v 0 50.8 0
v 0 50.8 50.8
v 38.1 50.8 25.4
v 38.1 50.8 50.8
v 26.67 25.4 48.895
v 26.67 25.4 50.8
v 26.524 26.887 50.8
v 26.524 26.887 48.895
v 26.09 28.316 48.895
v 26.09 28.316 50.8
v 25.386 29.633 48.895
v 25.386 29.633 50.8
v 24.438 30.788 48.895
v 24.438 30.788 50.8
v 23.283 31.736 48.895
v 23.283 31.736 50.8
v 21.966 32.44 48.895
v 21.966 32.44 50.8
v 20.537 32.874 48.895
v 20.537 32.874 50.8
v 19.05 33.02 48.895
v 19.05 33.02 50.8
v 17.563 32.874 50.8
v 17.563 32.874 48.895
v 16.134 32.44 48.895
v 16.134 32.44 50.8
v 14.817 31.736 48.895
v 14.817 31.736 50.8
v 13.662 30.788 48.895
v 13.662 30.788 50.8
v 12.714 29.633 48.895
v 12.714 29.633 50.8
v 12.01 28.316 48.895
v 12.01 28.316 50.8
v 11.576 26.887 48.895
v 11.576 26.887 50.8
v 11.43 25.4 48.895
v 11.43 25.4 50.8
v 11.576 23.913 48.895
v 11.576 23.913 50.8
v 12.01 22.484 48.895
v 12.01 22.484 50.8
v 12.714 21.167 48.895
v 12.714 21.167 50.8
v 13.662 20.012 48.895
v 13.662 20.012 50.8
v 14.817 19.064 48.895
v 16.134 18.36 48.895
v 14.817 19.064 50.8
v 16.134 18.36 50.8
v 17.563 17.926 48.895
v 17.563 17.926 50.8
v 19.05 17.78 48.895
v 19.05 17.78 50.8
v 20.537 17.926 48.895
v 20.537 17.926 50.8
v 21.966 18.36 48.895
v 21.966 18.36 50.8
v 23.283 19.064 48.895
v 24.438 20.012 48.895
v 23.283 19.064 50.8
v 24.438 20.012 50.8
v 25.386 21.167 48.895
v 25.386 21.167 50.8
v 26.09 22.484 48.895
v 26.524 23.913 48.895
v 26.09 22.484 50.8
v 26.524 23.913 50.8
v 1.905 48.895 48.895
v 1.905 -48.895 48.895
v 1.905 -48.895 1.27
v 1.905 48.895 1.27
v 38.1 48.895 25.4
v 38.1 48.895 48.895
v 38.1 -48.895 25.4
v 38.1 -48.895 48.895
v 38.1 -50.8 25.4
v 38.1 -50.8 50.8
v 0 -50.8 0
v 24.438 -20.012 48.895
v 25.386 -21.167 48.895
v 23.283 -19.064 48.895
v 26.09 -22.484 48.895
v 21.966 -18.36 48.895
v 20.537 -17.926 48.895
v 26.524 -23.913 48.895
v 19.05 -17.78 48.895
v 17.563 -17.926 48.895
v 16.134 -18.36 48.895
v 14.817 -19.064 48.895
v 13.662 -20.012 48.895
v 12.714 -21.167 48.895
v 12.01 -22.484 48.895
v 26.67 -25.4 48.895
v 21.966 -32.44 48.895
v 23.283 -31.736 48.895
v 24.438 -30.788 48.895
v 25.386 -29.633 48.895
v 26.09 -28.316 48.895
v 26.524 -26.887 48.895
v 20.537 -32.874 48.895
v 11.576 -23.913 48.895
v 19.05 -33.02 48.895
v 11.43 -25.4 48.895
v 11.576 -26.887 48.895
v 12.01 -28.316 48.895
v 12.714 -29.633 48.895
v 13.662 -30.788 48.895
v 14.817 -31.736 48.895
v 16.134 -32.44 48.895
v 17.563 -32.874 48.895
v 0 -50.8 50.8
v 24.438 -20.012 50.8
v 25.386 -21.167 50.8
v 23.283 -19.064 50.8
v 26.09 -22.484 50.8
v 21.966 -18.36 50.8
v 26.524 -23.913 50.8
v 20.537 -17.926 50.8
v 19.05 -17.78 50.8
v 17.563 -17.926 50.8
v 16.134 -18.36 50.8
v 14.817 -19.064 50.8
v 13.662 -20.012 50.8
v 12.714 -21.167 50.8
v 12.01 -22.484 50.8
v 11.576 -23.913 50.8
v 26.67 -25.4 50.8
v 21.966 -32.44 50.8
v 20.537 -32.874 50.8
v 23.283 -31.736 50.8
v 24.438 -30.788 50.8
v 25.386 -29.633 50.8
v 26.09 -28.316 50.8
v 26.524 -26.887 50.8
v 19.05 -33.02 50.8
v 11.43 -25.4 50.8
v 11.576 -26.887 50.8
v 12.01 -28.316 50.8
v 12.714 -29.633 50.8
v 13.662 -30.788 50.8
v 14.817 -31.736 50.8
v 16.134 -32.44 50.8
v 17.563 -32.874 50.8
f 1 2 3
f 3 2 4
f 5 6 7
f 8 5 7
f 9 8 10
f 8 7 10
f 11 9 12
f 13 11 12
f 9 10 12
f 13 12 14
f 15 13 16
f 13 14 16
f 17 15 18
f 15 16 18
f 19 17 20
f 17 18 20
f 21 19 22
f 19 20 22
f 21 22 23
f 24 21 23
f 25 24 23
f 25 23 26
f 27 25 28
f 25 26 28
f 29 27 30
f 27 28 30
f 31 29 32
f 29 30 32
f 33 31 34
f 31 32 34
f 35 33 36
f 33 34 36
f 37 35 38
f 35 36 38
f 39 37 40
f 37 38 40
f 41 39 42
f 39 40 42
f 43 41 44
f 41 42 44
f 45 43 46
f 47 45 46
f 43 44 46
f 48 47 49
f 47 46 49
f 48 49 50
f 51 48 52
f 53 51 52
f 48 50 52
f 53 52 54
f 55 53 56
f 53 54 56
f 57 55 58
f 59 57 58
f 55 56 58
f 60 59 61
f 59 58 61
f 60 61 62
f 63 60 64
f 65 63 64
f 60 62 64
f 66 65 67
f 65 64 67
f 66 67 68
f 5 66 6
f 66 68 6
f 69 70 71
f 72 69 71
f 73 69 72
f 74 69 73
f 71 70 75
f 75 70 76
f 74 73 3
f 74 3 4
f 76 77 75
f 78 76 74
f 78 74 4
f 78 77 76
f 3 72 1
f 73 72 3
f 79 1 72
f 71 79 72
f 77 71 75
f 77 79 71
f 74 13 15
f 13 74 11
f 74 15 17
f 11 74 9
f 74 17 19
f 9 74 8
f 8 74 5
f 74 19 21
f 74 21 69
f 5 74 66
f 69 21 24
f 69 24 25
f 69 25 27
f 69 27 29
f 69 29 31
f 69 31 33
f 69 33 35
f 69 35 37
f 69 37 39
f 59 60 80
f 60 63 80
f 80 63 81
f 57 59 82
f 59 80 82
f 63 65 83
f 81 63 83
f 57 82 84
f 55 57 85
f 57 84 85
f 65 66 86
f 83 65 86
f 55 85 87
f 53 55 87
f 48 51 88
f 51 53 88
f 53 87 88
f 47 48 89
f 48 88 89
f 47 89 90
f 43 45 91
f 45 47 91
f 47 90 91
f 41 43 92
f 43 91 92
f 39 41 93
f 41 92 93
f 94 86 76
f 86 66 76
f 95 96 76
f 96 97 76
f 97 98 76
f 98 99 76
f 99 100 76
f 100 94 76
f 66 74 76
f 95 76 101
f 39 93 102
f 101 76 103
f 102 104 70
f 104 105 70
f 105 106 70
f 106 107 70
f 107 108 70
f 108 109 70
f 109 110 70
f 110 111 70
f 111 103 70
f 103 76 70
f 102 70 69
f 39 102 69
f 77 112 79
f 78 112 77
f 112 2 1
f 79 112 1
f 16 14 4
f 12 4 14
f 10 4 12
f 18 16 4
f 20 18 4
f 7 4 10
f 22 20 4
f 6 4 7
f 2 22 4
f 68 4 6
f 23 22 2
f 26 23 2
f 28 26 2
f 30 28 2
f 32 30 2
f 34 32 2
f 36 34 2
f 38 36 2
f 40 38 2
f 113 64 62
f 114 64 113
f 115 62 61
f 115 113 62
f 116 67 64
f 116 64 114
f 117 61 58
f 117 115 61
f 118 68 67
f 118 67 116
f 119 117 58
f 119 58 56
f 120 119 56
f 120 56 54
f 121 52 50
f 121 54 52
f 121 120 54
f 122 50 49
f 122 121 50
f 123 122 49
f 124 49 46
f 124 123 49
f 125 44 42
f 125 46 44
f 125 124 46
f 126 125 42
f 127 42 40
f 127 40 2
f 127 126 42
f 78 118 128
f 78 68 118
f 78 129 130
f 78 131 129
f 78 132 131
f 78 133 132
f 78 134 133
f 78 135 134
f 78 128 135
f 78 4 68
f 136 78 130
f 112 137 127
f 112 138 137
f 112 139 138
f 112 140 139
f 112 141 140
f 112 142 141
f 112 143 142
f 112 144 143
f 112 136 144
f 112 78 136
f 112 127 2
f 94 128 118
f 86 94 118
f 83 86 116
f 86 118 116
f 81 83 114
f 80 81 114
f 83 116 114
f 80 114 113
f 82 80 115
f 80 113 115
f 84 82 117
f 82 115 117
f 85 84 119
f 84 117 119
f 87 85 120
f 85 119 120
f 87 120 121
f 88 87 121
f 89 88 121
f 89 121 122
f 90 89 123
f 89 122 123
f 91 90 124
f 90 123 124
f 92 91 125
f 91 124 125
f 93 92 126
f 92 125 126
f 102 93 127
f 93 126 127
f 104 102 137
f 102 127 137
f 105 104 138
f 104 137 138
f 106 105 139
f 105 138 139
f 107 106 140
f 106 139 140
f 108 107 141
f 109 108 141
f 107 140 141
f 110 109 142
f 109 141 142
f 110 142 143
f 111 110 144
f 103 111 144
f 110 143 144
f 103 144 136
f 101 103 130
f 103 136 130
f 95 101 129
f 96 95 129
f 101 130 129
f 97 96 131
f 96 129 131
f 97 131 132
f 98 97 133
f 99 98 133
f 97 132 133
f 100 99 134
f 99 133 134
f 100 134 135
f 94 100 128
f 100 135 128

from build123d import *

# Parameters (mm, degrees)
F1_DEPTH = 50.8
F2_R     = 7.62
F3_DEPTH = 50.801
F4_T     = -1.905


with BuildPart() as f1:
    # F0 (on Front) → F1 (new body, symmetric)
    with BuildSketch(Plane.XZ):
        Polygon((0, 50.8), (0, 0), (38.1, 25.4), (38.1, 50.8), align=None)
    extrude(amount=F1_DEPTH, both=True)

    # F2 (on face) → F3 (cut, through all)
    with BuildSketch(Plane.XY.offset(50.8)):
        with Locations((19.05, 25.4)):
            Circle(F2_R)
        with Locations((19.05, -25.4)):
            Circle(F2_R)
    extrude(amount=-F3_DEPTH, mode=Mode.SUBTRACT)

    # F4
    f4_openings = [f1.faces().sort_by_distance(p)[0] for p in [
        (19.05, 0, 12.7),
        (38.1, 0, 38.1),
        (11.43, -25.4, 29.104782),
        (11.43, 25.4, 29.104782),
    ]]
    offset(amount=F4_T, openings=f4_openings)


solid = f1.part
